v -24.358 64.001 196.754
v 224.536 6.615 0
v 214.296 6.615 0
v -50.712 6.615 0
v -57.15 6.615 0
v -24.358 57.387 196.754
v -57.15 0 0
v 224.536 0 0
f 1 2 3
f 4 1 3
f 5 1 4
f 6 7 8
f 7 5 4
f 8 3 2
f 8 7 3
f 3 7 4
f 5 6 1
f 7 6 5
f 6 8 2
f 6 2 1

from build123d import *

# Parameters (mm, degrees)
BOSS_EXTRUDE1_DEPTH = 152.4
SKETCH3_OUTSIDE_W   = 273.93
SKETCH3_OUTSIDE_H   = 229.576
CUT_EXTRUDE2_DEPTH  = 381.660734008
SHELL1_T            = -6.35
CUT_EXTRUDE3_DEPTH  = 381.660734008


with BuildPart() as part:
    # Sketch2 → Boss-Extrude1 (new body)
    with BuildSketch(Plane(origin=(0, 0, 0), x_dir=(1, 0, 0), z_dir=(0, 1, 0))):
        Polygon((-57.15, 0), (224.536, 0), (-24.357683353, -196.753899884), align=None)
    extrude(amount=BOSS_EXTRUDE1_DEPTH)

    # Sketch3 outside → Cut-Extrude2 (cut, through all)
    with BuildSketch(Plane(origin=(-63.5, 0, 0), x_dir=(0, 0, -1), z_dir=(1, 0, 0))):
        with Locations((-98.377, 76.2)):
            Rectangle(SKETCH3_OUTSIDE_W, SKETCH3_OUTSIDE_H)
        Polygon((0, 152.4), (-152.4, 107.95), (-261.257142857, 76.2), (-152.4, 44.45), (0, 0), align=None, mode=Mode.SUBTRACT)
    extrude(amount=CUT_EXTRUDE2_DEPTH, mode=Mode.SUBTRACT)

    # Shell1
    shell1_openings = [part.faces().sort_by_distance(p)[0] for p in [
        (83.693, 76.2, 0),
    ]]
    offset(amount=SHELL1_T, openings=shell1_openings, kind=Kind.INTERSECTION)

    # Sketch4 → Cut-Extrude3 (cut, through all)
    with BuildSketch(Plane(origin=(-63.5, 0, 0), x_dir=(0, 0, -1), z_dir=(1, 0, 0))):
        Polygon((0, 274.61160546), (-196.753899884, 217.225051327), (-196.753899884, 64.001137466), (0, 6.614583333), align=None)
    extrude(amount=CUT_EXTRUDE3_DEPTH, mode=Mode.SUBTRACT)


solid = part.part
